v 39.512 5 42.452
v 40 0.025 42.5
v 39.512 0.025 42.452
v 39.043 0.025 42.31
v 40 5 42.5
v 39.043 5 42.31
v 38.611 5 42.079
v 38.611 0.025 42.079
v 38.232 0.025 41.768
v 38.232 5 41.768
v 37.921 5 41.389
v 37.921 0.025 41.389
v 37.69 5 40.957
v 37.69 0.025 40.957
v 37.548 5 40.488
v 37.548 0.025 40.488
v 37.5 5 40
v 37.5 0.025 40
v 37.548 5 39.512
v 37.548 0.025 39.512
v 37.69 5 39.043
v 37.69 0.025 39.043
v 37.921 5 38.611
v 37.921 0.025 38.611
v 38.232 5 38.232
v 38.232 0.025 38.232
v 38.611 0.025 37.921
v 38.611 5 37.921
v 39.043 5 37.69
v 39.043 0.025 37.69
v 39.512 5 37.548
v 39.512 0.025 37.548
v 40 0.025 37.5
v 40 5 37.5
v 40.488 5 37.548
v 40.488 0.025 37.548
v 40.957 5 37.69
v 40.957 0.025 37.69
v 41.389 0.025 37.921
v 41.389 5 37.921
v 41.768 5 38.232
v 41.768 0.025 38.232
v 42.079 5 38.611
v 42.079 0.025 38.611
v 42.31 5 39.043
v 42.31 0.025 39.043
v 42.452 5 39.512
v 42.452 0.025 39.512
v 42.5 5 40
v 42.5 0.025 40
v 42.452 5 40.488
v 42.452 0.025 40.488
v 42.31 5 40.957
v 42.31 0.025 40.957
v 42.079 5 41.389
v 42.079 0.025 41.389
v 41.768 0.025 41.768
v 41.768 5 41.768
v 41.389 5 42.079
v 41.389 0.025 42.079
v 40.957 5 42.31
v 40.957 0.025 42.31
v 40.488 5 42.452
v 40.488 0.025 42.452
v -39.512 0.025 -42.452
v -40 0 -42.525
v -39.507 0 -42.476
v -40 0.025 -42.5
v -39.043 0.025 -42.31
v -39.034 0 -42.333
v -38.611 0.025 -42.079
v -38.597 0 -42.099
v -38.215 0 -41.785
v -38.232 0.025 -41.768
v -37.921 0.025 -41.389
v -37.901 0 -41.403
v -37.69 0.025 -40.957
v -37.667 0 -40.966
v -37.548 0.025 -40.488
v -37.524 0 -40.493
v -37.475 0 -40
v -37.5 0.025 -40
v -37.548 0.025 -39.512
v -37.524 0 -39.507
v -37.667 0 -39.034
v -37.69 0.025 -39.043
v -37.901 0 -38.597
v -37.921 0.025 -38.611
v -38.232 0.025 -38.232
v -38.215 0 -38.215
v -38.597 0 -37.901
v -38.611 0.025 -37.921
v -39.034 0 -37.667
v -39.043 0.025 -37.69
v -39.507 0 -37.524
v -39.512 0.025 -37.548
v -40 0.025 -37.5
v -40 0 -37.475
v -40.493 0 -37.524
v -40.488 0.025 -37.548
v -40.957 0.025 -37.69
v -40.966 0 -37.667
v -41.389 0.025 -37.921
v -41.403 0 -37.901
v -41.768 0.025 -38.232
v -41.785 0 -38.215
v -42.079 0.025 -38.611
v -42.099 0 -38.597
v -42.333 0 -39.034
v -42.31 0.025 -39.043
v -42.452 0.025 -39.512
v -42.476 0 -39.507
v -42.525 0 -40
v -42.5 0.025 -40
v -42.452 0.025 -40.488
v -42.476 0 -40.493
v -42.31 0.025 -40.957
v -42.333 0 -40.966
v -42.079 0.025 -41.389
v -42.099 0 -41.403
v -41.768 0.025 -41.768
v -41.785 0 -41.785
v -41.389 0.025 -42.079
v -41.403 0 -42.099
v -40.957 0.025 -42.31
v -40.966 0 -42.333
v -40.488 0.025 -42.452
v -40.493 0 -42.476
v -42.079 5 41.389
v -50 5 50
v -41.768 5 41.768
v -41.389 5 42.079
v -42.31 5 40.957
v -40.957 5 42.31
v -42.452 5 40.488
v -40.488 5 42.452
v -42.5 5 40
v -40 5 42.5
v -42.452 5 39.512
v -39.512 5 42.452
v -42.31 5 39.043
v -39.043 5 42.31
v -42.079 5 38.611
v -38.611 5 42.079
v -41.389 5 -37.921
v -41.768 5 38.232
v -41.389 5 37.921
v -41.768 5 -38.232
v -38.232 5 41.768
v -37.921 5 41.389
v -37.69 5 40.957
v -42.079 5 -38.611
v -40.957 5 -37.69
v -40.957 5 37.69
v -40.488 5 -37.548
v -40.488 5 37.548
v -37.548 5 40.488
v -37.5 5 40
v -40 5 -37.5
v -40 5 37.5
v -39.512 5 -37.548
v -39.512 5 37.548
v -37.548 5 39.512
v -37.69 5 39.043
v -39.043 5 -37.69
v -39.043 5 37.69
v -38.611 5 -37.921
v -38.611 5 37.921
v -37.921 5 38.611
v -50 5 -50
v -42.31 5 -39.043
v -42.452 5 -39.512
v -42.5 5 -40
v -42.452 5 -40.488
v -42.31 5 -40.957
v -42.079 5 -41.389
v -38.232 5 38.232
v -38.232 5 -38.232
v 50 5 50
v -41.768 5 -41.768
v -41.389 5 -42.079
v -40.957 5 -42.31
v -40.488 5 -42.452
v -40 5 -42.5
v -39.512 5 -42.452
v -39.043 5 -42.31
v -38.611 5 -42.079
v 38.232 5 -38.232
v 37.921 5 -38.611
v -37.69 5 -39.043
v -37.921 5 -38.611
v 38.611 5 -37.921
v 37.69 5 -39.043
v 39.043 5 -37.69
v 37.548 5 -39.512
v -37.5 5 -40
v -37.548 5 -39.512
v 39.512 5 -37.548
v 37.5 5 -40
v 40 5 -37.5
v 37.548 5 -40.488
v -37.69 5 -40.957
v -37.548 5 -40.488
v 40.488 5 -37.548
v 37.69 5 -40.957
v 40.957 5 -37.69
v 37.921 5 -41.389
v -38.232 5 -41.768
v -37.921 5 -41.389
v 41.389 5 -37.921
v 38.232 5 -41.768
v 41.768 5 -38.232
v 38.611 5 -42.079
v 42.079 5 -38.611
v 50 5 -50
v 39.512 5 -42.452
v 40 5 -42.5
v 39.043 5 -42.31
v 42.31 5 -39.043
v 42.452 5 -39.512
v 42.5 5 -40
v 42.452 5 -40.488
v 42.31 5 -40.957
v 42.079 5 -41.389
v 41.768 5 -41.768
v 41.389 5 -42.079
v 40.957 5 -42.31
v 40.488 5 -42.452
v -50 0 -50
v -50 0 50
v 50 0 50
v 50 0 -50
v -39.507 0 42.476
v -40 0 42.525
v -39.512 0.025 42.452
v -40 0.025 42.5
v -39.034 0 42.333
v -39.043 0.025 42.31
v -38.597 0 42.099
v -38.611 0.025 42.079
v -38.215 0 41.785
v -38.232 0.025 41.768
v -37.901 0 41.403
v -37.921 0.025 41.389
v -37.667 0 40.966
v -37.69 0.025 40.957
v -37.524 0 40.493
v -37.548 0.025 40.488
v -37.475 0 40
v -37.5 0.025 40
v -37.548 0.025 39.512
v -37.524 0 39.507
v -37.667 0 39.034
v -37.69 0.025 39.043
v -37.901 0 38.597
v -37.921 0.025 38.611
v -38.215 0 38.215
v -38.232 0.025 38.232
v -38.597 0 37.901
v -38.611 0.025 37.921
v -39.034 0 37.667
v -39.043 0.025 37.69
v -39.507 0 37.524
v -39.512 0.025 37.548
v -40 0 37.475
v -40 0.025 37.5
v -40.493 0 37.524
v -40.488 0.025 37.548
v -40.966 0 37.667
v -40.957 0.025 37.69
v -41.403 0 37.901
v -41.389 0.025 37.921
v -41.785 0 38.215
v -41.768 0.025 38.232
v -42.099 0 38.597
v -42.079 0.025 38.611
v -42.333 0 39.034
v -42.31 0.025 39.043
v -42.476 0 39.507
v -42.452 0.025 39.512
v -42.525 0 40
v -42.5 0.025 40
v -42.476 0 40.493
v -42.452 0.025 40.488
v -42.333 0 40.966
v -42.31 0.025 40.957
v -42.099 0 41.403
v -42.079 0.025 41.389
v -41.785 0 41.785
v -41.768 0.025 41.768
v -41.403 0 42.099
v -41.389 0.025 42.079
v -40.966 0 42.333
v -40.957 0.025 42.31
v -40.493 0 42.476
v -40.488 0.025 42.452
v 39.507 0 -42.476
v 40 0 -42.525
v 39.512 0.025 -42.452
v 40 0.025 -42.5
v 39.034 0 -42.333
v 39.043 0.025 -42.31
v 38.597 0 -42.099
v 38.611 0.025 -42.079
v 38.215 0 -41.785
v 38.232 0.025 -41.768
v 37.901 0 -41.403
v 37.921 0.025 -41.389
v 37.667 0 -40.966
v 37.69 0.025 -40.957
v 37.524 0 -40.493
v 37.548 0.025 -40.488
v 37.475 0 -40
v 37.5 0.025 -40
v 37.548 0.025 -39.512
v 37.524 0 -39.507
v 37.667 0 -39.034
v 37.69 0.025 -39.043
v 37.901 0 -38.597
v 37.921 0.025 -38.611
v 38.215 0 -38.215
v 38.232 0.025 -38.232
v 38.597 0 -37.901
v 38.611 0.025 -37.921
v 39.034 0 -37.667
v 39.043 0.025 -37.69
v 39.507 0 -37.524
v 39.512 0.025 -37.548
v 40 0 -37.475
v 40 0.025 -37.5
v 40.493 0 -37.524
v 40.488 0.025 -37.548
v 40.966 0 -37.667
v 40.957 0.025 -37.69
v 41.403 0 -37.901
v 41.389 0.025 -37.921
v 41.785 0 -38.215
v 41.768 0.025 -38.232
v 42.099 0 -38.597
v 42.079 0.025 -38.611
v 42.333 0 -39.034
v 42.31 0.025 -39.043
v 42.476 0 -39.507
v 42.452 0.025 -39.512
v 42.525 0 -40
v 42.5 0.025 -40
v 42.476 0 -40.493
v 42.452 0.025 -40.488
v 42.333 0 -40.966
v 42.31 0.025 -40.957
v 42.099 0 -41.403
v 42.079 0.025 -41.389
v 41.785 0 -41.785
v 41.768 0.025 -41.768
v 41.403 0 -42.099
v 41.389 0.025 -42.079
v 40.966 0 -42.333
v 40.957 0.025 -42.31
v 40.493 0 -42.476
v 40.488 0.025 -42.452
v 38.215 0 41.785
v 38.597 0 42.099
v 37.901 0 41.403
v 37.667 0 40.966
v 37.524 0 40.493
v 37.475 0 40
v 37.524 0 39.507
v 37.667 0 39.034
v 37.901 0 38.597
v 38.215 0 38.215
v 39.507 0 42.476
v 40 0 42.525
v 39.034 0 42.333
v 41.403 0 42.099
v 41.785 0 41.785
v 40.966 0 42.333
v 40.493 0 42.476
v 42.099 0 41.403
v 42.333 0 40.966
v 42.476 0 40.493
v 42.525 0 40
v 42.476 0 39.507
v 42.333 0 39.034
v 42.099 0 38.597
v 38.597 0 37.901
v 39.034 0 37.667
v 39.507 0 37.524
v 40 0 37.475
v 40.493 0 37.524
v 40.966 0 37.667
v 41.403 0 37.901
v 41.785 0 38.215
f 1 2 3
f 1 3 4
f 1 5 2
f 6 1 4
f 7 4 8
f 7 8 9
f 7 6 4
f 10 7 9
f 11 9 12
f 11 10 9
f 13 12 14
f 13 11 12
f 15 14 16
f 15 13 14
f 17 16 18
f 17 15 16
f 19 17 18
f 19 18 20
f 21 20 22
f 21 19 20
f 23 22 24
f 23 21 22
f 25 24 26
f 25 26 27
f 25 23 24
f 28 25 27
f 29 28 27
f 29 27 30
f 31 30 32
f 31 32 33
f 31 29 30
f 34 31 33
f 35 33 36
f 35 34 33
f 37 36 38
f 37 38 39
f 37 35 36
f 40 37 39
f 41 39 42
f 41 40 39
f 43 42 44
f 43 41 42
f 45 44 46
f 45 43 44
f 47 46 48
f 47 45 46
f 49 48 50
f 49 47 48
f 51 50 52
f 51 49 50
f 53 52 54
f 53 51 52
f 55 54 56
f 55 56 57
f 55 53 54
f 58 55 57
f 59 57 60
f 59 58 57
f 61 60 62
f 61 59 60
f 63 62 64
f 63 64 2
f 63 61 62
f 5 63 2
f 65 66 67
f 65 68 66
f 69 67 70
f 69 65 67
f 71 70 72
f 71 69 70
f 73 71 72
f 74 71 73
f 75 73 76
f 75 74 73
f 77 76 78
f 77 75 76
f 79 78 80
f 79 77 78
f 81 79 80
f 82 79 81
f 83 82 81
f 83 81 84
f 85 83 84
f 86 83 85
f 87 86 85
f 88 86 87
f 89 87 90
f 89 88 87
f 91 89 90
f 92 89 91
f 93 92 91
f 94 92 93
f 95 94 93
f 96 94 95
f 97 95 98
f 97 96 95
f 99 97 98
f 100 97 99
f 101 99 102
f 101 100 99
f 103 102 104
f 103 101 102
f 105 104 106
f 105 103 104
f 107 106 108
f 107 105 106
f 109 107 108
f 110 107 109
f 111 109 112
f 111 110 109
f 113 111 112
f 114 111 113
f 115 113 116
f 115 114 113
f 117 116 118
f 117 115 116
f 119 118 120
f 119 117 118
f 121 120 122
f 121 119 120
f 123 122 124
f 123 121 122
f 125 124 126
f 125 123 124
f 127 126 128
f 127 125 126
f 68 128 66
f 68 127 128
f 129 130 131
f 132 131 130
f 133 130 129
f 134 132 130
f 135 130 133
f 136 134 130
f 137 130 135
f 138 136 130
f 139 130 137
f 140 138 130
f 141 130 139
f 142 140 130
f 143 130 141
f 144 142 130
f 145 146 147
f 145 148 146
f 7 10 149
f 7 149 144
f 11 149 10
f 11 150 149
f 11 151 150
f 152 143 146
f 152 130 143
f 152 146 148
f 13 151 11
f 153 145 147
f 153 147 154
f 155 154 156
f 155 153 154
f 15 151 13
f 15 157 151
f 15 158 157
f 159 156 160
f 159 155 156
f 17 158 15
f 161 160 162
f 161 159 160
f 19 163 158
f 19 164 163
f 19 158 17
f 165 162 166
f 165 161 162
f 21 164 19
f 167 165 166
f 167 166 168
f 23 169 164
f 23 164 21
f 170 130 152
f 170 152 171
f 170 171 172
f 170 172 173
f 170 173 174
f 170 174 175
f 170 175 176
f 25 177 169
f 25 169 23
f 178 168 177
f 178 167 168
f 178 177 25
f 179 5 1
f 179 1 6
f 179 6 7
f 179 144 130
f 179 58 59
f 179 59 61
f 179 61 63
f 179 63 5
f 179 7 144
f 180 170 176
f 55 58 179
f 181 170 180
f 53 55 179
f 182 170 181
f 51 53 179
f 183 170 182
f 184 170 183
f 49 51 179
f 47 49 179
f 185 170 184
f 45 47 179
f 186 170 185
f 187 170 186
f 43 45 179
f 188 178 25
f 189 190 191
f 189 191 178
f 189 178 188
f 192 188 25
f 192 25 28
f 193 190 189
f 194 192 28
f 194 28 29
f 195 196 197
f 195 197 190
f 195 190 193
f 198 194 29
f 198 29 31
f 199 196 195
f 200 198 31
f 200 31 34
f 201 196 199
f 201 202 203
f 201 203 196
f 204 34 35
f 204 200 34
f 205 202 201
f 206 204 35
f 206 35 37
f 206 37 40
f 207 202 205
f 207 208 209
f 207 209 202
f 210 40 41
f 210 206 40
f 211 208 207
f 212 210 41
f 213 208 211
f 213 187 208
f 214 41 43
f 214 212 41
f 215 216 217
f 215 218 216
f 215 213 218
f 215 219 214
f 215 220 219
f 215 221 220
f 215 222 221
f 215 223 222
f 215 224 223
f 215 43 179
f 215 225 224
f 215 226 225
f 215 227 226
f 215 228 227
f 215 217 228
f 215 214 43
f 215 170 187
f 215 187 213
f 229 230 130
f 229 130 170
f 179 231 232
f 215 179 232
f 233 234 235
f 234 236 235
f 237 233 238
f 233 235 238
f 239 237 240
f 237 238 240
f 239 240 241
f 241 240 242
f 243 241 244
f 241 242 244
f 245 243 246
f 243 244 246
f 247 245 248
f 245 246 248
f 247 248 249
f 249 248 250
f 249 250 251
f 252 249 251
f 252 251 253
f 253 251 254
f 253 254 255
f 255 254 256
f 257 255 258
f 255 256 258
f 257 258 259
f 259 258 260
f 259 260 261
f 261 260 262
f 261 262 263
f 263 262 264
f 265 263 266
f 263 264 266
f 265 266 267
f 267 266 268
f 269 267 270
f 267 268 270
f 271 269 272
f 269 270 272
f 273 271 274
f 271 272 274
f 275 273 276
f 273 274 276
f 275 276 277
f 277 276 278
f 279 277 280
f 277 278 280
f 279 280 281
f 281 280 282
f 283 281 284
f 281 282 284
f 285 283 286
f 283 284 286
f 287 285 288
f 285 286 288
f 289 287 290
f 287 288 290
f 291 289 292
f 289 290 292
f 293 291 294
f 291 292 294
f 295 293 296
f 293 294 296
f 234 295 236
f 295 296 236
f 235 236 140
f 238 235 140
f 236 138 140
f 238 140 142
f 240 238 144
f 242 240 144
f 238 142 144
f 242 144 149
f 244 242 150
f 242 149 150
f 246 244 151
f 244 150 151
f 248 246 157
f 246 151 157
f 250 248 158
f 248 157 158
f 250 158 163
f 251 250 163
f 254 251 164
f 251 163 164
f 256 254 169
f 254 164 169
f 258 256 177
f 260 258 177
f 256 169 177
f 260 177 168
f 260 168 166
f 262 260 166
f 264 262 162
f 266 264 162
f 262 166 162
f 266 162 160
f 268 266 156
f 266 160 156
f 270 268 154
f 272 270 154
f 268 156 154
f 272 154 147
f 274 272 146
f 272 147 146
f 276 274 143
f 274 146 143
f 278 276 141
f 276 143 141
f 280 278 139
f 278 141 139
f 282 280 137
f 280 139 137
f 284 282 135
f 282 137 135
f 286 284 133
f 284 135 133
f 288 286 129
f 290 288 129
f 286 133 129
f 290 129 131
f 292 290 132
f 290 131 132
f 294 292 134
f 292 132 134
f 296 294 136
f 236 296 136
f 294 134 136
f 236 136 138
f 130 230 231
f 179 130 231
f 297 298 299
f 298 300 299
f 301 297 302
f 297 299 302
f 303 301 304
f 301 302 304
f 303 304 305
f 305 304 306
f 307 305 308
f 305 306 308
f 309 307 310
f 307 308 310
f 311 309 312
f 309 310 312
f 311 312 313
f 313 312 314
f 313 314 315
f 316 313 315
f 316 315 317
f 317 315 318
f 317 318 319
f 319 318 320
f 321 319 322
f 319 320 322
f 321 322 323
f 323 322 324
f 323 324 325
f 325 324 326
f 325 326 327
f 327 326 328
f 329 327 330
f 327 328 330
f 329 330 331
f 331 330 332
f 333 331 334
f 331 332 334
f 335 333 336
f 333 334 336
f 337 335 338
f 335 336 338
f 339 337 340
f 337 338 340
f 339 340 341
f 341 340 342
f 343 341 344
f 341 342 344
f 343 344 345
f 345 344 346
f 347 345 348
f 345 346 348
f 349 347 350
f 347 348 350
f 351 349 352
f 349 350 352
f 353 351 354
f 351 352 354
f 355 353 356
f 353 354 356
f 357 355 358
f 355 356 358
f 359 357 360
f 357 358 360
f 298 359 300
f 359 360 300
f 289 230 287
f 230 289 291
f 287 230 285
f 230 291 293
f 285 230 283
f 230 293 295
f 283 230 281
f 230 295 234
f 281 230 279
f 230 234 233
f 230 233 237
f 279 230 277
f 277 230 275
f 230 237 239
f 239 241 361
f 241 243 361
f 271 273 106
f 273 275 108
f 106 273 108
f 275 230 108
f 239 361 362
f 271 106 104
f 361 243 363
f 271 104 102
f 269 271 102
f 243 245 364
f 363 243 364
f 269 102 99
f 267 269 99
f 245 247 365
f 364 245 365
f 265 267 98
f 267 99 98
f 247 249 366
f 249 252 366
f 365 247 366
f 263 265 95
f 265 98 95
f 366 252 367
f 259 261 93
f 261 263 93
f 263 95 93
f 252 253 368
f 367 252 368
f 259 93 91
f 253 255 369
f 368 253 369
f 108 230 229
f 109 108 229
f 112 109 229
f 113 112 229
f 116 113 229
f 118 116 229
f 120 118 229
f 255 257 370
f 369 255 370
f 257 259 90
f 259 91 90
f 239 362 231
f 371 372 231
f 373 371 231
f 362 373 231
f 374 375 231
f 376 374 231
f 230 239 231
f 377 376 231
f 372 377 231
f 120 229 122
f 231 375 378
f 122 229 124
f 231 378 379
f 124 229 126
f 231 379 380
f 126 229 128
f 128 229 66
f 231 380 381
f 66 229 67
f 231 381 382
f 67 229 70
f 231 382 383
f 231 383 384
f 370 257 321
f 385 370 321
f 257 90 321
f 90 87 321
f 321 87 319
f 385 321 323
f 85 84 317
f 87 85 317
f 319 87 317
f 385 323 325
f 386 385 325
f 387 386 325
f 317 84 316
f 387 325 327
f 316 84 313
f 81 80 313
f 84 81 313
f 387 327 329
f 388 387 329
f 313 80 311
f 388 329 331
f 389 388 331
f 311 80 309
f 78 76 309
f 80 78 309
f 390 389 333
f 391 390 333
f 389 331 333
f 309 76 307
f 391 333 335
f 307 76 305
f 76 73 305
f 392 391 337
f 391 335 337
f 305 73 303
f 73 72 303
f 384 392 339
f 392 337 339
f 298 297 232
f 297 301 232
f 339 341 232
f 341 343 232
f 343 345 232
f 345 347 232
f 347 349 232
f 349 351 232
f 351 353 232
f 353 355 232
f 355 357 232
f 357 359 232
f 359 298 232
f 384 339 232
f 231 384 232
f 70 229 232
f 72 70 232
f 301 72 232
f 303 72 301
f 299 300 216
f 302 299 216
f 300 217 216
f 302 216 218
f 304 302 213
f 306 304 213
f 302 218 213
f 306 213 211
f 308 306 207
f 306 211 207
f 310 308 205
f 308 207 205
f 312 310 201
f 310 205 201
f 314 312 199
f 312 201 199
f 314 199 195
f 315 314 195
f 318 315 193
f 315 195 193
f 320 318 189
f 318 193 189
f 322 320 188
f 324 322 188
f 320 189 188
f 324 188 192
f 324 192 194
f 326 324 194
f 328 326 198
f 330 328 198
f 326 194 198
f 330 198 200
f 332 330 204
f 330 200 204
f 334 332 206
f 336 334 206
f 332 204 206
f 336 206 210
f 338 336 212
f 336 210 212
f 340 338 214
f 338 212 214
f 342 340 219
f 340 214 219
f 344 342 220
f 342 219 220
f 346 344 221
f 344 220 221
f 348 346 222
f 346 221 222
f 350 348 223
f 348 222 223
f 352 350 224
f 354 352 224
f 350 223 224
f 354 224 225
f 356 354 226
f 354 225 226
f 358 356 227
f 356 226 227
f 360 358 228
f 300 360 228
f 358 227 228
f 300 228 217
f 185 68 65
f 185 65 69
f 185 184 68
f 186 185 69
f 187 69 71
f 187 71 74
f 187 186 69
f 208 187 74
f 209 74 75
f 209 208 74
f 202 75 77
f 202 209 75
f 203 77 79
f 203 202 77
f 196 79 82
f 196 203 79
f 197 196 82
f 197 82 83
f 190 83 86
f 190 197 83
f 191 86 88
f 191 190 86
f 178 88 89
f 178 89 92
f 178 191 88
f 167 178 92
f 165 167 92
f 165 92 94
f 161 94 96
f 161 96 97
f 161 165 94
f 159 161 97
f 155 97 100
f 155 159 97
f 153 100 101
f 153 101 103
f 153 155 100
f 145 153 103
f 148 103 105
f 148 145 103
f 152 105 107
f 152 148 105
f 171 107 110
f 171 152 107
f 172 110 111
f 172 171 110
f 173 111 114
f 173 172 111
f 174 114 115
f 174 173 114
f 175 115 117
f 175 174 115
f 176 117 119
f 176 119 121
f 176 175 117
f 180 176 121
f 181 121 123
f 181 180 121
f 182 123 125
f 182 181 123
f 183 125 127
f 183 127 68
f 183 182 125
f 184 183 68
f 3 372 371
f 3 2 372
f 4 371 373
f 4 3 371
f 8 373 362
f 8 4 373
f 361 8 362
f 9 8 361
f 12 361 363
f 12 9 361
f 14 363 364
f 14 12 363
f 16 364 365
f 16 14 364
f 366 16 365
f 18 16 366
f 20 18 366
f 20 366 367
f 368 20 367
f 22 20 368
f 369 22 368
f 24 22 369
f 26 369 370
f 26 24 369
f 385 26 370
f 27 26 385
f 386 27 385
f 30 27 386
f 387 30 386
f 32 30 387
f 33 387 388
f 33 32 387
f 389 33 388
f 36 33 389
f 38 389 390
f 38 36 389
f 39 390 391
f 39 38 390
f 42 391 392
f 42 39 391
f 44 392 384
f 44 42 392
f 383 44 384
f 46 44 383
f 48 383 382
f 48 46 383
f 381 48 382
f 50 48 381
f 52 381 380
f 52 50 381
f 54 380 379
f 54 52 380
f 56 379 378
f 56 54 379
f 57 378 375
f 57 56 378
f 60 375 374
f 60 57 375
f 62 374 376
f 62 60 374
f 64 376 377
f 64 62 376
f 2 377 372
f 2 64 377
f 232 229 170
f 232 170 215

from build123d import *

# Parameters (mm, degrees)
SKETCH1_W           = 100
SKETCH1_H           = 100
BOSS_EXTRUDE1_DEPTH = 5


with BuildPart() as part:
    # Sketch1 → Boss-Extrude1 (new body)
    with BuildSketch(Plane(origin=(0, 0, 0), x_dir=(1, 0, 0), z_dir=(0, 1, 0))):
        Rectangle(SKETCH1_W, SKETCH1_H)
    extrude(amount=BOSS_EXTRUDE1_DEPTH)

    # Sketch4 → Ø5.0mm Dowel Hole1 (revolve, cut)
    with BuildSketch(Plane(origin=(40, 5, 40), x_dir=(0, 0, 1), z_dir=(1, 0, 0))):
        Polygon((0, 0), (0, 5), (2.525, 5), (2.5, 4.975), (2.5, 0), align=None)
    f_5_0mm_dowel_hole1 = revolve(axis=Axis((40, 11.35, 40), (0, -1, 0)), mode=Mode.SUBTRACT)

    # Mirror1: Ø5.0mm Dowel Hole1 across plane
    add(f_5_0mm_dowel_hole1.mirror(Plane(origin=(0, 0, 0), x_dir=(0, 0, 1), z_dir=(1, 0, 0))), mode=Mode.SUBTRACT)

    # Mirror1 at the second plane: Ø5.0mm Dowel Hole1 across plane
    add(f_5_0mm_dowel_hole1.mirror(Plane.XY), mode=Mode.SUBTRACT)

    # Mirror1 at the second plane copy 1 sketc → Mirror1 at the second plane copy 1 (revolve, cut)
    with BuildSketch(Plane(origin=(-40, 5, -40), x_dir=(0, 0, -1), z_dir=(-1, 0, 0))):
        Polygon((0, 0), (0, 5), (2.525, 5), (2.5, 4.975), (2.5, 0), align=None)
    revolve(axis=Axis((-40, 11.35, -40), (0, -1, 0)), mode=Mode.SUBTRACT)


solid = part.part
